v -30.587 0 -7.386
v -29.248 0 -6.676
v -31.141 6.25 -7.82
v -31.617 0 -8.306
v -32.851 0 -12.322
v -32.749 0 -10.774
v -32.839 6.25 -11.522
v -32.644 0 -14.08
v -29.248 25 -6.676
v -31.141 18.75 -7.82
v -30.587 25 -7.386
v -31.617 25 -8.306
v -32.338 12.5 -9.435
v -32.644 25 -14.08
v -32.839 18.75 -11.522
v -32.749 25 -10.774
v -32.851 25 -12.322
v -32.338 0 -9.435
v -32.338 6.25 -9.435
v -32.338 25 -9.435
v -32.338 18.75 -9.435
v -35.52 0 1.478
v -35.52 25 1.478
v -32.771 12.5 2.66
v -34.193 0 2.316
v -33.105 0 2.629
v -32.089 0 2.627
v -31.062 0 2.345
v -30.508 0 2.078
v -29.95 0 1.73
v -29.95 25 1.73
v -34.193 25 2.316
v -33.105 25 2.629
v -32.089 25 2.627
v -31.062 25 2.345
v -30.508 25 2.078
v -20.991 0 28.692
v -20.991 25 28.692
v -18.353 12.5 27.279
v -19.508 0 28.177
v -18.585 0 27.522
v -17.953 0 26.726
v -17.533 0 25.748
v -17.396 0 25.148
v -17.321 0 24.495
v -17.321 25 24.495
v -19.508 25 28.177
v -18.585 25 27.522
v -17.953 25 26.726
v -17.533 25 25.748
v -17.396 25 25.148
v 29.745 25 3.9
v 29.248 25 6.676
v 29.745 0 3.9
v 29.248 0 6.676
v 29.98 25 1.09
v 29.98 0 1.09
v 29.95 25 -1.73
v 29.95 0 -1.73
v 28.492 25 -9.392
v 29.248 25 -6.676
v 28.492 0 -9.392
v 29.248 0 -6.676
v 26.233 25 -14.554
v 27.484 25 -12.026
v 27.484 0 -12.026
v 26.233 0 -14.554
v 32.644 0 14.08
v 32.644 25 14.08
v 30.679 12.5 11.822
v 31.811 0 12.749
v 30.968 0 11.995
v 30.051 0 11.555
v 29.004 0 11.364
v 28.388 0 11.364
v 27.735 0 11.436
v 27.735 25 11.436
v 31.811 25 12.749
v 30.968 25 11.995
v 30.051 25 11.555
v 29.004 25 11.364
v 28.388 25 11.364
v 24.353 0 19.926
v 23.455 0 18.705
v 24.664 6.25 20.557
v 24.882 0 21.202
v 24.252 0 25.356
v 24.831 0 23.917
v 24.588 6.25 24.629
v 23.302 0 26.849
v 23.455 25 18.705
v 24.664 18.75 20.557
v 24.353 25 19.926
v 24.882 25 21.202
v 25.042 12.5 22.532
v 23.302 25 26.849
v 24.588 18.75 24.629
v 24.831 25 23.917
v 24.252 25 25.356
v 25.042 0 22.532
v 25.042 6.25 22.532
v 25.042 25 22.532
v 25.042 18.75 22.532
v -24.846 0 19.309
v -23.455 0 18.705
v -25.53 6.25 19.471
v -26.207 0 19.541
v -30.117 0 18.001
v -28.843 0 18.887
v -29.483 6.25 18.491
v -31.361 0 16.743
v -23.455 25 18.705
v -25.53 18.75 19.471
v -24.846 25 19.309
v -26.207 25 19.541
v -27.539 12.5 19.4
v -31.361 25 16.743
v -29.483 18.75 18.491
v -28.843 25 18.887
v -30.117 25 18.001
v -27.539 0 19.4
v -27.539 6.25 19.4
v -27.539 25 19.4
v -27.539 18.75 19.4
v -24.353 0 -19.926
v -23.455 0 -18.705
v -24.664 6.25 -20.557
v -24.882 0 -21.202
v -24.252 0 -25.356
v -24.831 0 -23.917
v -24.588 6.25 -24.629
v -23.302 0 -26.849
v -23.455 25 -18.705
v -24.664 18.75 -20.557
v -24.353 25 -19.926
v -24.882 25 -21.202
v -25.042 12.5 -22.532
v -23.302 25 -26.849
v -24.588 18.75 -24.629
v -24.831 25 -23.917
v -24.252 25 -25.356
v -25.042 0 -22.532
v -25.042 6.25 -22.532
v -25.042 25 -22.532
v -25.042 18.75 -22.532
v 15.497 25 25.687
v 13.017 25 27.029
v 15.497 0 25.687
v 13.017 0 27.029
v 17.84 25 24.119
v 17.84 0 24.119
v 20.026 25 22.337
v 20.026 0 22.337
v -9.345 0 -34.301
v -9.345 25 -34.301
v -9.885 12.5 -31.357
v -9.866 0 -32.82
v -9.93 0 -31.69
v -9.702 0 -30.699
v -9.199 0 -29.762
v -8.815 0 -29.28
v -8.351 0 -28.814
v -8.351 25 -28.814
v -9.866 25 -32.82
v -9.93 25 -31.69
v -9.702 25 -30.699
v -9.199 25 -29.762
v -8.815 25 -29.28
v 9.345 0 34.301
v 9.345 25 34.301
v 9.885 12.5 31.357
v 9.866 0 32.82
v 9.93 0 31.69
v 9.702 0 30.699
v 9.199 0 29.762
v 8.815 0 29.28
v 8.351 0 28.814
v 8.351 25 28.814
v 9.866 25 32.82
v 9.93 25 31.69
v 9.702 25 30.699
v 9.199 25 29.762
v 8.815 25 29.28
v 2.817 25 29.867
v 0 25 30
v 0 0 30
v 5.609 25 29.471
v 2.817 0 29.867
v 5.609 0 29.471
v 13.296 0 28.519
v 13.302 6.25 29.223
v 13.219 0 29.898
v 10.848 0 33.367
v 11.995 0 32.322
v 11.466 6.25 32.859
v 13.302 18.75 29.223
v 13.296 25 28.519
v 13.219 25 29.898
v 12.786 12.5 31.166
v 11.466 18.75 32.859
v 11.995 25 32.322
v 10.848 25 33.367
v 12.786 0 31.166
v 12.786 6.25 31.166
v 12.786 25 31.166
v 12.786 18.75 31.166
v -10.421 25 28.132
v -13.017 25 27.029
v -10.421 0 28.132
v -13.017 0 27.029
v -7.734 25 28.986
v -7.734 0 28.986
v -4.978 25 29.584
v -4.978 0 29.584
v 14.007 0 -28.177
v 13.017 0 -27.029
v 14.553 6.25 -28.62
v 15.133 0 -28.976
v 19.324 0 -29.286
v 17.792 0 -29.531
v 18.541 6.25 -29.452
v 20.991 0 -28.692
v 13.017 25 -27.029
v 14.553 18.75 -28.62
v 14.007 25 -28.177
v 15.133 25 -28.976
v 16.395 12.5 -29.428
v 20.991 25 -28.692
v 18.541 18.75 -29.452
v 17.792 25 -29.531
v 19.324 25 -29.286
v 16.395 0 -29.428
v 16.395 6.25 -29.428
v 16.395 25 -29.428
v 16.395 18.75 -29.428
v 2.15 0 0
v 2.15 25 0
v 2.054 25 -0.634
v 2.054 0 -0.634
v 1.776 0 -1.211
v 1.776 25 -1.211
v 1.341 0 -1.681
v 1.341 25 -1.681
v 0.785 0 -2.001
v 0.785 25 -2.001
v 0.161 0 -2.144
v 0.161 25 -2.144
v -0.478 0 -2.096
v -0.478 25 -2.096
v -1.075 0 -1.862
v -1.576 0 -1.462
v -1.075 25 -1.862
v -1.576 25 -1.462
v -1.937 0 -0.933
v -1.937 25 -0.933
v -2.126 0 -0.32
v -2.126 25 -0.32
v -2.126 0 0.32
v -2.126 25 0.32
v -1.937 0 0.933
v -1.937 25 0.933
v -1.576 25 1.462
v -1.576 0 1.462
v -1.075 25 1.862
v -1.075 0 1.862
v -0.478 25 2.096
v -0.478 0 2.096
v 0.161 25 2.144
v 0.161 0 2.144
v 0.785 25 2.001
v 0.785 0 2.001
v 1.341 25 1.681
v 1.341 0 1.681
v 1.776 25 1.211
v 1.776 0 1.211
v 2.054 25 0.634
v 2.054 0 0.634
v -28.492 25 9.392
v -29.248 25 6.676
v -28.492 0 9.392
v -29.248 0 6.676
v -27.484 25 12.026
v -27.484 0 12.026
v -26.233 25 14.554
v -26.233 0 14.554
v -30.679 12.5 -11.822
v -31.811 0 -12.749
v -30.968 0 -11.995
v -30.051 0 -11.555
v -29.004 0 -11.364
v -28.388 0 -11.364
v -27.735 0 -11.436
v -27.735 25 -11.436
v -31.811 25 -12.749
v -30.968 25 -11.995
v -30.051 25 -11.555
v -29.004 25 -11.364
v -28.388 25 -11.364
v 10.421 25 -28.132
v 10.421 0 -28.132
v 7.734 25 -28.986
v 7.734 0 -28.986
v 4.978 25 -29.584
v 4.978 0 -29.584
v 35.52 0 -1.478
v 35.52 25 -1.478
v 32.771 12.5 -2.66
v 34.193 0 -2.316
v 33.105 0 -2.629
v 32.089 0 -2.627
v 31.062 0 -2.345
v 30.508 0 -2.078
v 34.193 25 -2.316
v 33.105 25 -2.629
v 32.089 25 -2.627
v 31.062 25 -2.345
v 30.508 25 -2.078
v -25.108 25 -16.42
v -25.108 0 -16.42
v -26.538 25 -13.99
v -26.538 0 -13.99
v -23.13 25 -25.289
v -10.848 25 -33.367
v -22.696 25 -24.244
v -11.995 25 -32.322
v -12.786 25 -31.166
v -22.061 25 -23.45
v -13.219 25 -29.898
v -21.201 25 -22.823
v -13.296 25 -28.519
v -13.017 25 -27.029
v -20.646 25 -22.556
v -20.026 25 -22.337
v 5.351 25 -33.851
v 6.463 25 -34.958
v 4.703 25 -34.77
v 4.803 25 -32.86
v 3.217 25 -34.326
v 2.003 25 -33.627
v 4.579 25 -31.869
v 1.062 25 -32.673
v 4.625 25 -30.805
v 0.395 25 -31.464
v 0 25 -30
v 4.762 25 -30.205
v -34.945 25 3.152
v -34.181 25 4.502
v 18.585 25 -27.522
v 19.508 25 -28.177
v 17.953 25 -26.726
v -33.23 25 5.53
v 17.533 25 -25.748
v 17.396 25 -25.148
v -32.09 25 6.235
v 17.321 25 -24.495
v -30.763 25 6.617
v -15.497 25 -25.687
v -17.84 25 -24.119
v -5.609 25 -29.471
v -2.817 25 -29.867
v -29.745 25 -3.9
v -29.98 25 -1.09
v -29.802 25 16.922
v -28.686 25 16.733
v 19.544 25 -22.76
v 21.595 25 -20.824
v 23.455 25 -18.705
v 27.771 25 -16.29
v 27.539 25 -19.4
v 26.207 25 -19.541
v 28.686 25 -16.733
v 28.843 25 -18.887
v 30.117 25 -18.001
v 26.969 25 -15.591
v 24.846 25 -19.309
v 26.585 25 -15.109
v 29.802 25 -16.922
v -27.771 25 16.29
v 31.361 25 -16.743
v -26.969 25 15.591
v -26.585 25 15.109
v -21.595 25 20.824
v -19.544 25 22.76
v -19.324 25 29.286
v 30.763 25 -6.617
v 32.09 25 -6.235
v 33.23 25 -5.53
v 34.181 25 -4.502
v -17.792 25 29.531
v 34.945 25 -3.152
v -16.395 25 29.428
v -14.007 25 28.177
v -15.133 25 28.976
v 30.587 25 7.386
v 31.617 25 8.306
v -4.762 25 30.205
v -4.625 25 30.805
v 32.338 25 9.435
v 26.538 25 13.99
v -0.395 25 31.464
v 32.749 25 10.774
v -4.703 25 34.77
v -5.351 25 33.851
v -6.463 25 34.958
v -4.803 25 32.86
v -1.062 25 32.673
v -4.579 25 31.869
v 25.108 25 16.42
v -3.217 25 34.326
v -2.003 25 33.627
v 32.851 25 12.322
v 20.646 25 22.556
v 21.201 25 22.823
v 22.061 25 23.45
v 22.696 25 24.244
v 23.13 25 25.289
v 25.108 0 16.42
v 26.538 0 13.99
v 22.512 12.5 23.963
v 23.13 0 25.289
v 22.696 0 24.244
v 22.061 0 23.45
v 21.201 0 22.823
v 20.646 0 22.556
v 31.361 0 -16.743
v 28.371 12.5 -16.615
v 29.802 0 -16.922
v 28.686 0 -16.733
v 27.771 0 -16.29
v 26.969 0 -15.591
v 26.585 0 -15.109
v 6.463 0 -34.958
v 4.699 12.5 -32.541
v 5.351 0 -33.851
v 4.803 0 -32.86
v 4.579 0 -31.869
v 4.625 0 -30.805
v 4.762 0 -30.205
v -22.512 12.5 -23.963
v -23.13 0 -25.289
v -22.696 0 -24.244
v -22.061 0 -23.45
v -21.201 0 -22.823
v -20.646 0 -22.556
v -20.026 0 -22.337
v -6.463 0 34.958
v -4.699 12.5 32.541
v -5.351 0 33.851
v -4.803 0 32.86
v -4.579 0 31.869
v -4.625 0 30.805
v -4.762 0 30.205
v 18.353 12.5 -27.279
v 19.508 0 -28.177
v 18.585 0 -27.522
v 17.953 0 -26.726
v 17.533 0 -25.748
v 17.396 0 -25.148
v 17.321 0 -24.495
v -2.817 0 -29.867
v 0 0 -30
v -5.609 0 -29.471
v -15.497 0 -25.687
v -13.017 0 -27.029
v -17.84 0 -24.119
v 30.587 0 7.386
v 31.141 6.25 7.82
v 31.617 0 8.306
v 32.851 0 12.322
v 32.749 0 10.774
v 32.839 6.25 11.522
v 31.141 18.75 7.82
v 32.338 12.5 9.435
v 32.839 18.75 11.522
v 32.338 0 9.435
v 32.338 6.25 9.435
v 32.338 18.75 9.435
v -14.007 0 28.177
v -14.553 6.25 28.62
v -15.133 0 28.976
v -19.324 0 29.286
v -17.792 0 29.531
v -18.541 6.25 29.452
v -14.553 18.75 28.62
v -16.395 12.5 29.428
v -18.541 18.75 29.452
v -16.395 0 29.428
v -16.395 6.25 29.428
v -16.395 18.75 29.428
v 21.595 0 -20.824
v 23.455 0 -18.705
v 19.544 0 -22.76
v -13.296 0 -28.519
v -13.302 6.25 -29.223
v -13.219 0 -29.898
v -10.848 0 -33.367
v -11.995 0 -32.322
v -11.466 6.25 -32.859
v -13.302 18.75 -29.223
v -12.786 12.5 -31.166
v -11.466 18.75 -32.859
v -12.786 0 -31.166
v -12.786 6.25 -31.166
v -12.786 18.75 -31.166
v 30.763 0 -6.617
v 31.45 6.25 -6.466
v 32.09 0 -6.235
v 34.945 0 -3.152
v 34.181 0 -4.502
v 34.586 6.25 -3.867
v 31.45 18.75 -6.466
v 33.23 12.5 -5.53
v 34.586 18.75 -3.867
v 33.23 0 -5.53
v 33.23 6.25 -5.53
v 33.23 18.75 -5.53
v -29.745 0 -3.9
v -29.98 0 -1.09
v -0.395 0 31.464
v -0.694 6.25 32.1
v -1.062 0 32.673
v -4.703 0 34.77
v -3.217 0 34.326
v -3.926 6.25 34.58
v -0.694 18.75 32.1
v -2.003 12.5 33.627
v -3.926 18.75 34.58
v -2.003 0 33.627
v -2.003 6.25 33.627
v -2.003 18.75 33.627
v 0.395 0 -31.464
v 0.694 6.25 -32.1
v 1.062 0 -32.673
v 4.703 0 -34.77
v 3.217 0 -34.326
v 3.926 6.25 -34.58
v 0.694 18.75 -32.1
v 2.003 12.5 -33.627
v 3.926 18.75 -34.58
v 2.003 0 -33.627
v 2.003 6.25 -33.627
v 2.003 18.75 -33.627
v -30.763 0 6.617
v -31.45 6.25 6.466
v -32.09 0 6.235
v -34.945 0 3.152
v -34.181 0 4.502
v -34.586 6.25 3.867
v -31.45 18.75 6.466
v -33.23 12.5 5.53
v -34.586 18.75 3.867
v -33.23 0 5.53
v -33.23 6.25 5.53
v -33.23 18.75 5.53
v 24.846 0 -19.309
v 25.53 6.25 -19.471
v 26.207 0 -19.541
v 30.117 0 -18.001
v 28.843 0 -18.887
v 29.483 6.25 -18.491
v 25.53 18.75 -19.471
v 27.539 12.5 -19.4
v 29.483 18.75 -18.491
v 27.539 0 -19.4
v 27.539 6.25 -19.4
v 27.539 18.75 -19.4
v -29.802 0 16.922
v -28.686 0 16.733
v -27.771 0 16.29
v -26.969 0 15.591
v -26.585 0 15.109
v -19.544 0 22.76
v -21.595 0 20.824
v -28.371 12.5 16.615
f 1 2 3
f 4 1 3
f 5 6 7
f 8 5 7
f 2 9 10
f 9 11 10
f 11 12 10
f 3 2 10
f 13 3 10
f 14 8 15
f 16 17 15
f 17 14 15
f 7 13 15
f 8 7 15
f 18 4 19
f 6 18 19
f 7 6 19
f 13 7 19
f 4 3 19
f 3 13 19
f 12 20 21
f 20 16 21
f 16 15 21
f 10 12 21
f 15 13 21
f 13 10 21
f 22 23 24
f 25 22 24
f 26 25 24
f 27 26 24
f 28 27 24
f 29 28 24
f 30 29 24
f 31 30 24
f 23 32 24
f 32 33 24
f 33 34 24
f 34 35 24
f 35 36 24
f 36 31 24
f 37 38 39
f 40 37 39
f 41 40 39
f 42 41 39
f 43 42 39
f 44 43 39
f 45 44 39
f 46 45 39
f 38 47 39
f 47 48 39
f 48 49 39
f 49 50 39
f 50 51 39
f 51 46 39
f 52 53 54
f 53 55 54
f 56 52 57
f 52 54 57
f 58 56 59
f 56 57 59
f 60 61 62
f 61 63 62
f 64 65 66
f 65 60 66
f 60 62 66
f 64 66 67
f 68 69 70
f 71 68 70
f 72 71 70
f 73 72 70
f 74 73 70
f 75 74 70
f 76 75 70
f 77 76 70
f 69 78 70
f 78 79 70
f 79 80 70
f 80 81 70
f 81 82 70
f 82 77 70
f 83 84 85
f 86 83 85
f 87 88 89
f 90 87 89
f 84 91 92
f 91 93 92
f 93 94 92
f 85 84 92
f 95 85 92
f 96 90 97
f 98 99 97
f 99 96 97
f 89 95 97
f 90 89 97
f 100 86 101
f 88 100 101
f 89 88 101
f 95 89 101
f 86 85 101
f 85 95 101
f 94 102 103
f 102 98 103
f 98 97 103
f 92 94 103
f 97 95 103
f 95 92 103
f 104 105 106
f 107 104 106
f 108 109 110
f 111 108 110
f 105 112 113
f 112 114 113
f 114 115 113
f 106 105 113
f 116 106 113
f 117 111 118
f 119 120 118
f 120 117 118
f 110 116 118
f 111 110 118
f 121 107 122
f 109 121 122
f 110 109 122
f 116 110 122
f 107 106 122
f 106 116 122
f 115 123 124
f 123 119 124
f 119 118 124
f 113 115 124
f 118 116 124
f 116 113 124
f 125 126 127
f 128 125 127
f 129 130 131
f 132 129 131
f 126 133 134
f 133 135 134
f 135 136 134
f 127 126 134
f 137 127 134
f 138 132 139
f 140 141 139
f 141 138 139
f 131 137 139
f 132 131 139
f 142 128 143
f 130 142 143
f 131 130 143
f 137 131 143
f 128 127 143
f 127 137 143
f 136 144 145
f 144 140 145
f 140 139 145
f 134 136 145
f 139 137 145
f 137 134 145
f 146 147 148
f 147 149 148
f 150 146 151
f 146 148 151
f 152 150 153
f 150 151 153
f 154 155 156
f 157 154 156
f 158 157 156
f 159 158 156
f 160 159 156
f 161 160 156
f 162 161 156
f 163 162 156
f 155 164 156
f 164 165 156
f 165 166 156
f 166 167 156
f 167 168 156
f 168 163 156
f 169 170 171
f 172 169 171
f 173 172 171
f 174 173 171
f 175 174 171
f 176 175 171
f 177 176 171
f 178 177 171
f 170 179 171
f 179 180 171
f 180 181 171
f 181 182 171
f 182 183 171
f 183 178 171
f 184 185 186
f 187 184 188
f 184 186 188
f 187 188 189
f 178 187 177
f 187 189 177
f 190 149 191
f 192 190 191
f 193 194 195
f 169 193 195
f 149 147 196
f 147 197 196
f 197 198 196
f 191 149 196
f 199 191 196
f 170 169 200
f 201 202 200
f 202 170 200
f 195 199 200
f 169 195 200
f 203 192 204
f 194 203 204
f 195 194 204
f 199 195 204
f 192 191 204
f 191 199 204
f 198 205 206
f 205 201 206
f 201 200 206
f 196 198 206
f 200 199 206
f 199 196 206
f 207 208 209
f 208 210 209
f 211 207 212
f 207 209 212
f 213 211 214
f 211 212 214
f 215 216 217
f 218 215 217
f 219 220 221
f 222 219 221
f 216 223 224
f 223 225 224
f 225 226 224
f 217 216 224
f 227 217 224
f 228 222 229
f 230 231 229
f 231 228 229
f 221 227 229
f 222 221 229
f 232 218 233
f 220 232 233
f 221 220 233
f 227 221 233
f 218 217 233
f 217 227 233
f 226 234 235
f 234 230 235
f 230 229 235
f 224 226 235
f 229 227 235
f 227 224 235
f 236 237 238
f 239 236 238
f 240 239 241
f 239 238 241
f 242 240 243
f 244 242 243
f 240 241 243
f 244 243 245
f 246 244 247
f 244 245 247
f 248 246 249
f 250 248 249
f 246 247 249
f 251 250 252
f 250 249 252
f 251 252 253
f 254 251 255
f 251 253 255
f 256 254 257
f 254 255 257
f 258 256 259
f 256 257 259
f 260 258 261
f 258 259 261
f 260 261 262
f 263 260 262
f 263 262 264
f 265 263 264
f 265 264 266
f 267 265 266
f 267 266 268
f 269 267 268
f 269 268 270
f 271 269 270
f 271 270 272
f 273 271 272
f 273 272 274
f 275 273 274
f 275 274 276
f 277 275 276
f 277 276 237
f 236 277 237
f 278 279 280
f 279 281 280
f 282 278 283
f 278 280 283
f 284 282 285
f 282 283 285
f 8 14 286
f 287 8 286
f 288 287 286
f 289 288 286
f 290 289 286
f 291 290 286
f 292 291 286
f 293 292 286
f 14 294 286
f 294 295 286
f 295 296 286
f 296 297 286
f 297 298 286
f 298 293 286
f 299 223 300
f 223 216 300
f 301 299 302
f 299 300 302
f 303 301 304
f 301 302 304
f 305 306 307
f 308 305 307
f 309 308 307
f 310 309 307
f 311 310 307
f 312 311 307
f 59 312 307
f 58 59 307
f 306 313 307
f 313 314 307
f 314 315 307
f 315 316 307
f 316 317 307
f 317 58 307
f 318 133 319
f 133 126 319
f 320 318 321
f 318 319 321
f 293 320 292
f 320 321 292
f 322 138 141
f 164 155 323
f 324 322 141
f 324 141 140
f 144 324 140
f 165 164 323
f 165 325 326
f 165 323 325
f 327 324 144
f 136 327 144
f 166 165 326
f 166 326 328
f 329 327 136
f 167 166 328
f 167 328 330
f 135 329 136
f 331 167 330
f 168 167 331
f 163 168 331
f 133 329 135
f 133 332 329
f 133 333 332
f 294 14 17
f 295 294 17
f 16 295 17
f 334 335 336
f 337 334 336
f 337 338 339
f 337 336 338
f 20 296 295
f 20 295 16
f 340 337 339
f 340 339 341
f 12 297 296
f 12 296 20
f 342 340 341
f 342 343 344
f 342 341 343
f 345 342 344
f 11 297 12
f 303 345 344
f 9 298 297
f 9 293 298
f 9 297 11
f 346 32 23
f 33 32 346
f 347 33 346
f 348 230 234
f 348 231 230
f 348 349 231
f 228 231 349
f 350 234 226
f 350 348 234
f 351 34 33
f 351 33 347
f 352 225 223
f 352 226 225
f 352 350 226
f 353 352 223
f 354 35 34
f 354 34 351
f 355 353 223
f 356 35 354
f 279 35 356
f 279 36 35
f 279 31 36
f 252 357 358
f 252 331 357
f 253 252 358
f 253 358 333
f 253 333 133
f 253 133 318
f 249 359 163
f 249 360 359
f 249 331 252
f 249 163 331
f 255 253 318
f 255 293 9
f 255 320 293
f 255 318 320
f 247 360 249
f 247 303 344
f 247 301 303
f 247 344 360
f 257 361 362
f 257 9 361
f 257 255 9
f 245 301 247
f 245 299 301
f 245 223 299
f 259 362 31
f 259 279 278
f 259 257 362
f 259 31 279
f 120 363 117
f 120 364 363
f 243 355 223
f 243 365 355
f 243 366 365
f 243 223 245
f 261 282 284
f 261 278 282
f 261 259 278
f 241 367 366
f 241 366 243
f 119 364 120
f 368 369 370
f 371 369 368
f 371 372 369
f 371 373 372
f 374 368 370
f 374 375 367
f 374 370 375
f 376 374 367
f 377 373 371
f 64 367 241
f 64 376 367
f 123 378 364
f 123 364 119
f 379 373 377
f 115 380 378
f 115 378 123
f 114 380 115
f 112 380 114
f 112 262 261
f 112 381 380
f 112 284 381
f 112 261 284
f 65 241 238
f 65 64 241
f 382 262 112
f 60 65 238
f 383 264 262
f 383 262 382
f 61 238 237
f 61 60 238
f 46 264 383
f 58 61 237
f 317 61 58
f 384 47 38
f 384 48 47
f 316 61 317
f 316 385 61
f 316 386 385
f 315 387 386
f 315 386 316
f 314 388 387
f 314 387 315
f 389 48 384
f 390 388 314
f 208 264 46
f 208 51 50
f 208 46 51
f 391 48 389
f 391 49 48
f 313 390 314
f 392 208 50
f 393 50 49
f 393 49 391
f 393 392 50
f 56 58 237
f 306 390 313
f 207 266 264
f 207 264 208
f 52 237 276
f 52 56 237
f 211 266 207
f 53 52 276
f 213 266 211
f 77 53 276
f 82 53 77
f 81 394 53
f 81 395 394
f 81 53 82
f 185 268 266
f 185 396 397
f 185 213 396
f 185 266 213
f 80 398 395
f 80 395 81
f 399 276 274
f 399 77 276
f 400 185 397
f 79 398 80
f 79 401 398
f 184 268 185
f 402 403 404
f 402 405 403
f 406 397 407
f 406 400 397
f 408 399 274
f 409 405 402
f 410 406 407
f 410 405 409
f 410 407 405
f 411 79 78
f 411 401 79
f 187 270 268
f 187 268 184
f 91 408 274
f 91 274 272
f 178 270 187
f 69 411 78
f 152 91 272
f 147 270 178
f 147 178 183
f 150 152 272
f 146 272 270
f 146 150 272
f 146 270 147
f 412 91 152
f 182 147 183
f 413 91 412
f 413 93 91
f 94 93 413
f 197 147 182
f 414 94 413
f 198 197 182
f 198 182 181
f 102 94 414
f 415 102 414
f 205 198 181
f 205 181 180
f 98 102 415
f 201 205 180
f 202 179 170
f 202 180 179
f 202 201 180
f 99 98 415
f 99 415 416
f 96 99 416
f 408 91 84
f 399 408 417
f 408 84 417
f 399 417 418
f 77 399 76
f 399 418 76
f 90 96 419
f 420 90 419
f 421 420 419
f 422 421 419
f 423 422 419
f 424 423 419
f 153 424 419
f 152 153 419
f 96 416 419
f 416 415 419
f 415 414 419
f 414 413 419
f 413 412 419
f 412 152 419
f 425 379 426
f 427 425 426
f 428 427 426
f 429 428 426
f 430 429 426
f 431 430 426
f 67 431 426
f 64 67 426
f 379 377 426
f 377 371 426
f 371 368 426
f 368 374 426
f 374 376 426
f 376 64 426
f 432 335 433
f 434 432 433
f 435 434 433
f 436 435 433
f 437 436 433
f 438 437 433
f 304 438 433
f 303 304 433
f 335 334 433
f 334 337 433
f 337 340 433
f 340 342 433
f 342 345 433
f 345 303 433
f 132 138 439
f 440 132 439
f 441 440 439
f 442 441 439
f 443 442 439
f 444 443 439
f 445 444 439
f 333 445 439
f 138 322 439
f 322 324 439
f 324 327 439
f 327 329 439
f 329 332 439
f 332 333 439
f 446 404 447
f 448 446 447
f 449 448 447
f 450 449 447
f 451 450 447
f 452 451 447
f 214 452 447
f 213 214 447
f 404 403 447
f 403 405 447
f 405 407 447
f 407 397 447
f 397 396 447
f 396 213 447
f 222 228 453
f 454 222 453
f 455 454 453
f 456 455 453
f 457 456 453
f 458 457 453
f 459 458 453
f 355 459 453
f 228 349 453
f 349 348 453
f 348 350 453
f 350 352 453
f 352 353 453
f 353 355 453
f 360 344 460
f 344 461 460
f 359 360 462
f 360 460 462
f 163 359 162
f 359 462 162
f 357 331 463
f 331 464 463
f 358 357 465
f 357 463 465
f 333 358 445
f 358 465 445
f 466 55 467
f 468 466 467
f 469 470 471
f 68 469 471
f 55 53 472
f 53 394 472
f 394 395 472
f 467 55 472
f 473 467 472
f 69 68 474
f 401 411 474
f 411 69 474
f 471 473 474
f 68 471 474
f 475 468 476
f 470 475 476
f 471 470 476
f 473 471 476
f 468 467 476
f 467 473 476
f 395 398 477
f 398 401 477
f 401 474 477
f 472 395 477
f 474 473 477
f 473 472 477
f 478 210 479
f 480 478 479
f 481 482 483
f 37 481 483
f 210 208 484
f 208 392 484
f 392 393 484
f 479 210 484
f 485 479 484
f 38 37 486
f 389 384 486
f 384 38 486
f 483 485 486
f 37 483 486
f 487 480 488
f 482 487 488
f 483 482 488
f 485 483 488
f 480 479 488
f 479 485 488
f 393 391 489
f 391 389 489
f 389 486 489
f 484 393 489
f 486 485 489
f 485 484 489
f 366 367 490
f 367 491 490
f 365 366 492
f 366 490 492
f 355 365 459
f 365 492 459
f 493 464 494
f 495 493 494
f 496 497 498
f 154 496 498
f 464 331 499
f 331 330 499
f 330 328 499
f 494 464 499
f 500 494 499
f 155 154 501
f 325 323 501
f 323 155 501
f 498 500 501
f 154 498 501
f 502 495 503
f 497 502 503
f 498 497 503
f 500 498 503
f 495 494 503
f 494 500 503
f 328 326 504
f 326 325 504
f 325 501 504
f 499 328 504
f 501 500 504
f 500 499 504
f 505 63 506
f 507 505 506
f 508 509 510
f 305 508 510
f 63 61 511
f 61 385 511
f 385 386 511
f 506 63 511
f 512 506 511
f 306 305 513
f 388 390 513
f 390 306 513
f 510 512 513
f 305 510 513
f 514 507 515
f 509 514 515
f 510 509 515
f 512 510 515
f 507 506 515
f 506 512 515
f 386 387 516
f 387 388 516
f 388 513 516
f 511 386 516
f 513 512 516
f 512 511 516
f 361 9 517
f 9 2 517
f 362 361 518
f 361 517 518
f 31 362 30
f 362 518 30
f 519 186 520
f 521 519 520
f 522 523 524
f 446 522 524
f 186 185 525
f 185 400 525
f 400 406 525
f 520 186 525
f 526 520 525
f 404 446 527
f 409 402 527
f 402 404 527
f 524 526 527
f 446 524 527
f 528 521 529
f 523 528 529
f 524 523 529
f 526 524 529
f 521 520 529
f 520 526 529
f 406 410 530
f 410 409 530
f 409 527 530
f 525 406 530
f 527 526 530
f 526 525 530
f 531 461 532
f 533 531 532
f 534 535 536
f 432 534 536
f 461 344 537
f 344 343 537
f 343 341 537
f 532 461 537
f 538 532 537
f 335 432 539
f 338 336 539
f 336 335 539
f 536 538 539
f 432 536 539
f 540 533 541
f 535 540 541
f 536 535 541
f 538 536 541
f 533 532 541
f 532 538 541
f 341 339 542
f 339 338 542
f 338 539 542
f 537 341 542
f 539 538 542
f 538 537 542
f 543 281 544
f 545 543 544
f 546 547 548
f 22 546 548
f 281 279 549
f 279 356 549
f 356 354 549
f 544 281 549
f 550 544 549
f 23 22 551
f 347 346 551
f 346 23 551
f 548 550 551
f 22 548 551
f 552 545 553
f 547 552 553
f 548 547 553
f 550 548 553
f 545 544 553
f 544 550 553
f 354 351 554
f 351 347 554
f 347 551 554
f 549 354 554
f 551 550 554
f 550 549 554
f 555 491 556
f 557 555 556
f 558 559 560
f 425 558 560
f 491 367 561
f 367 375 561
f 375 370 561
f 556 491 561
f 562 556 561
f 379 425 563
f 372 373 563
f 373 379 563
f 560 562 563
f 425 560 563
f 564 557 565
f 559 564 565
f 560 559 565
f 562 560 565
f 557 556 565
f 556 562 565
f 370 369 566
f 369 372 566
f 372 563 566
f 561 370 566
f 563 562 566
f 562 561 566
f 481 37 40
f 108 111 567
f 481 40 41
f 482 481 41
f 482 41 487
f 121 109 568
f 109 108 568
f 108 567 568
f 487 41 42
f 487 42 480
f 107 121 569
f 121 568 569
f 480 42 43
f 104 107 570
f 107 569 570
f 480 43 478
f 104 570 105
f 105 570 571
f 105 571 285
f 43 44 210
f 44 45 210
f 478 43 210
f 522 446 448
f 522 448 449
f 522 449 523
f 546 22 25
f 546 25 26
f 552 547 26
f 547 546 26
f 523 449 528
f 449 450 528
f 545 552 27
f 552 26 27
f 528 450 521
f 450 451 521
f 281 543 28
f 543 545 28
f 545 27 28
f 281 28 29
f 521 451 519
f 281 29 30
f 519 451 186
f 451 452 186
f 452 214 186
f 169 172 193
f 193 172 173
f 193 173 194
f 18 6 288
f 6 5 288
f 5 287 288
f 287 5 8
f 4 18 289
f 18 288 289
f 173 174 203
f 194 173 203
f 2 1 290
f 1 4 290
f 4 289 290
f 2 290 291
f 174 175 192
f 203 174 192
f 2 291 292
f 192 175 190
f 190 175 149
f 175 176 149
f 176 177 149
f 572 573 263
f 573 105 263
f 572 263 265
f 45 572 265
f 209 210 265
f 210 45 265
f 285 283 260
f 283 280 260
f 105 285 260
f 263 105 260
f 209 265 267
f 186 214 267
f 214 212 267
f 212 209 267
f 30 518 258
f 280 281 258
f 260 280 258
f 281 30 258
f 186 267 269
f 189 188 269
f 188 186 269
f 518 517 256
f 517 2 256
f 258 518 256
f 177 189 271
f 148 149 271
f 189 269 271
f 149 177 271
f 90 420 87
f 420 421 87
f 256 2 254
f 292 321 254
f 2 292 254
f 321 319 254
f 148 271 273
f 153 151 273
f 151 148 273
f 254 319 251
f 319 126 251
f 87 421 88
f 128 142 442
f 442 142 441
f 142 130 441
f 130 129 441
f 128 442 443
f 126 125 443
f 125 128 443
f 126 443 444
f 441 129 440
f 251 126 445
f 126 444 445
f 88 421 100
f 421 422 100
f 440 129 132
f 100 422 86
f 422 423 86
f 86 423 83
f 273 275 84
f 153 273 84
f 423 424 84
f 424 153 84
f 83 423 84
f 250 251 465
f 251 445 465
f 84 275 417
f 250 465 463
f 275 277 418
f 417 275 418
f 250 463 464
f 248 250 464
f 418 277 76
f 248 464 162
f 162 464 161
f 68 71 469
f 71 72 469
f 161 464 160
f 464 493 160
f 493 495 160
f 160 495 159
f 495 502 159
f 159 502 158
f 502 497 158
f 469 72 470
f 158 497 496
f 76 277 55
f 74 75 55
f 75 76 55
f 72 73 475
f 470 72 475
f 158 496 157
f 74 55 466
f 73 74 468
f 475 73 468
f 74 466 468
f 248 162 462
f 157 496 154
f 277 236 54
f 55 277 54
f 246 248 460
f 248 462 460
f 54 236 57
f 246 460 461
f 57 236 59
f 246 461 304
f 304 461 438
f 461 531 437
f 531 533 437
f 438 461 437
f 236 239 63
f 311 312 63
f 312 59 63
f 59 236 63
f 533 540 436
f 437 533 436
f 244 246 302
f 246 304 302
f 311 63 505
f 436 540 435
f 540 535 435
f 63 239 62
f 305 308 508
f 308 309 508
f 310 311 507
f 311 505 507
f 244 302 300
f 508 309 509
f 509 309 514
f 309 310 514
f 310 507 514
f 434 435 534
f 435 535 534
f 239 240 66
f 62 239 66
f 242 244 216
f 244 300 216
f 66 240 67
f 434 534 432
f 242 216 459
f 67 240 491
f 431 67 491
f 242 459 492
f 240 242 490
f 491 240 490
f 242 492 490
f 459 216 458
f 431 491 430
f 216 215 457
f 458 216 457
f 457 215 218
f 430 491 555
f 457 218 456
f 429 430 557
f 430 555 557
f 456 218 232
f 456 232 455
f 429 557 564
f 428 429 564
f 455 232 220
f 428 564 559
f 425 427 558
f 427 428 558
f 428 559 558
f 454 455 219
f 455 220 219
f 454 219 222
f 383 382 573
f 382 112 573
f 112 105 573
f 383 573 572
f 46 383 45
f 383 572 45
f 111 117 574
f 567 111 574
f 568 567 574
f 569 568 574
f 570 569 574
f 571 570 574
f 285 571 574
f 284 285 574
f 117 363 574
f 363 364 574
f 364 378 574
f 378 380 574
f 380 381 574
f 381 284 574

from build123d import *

# Parameters (mm, degrees)
SKETCH1_R           = 30
BOSS_EXTRUDE1_DEPTH = 25
SKETCH2_R           = 2.15
CUT_EXTRUDE1_DEPTH  = 26
BOSS_EXTRUDE2_DEPTH = 25
CIRPATTERN1_COUNT   = 14


with BuildPart() as part:
    # Sketch1 → Boss-Extrude1 (new body)
    with BuildSketch(Plane(origin=(0, 0, 0), x_dir=(1, 0, 0), z_dir=(0, 1, 0))):
        Circle(SKETCH1_R)
    extrude(amount=BOSS_EXTRUDE1_DEPTH)

    # Sketch2 → Cut-Extrude1 (cut, through all)
    with BuildSketch(Plane(origin=(0, 25, 0), x_dir=(1, 0, 0), z_dir=(0, 1, 0))):
        Circle(SKETCH2_R)
    extrude(amount=-CUT_EXTRUDE1_DEPTH, mode=Mode.SUBTRACT)

    # Sketch3 → Boss-Extrude2 (add, through all)
    with BuildSketch(Plane(origin=(0, 25, 0), x_dir=(1, 0, 0), z_dir=(0, 1, 0))):
        with BuildLine():
            Line((0, 30), (3.378956964, 26.809860285))
            Line((3.378956964, 26.809860285), (4.977675541, 29.584163774))
            add(Edge.make_bspline(
                [(6.463090103, 34.958464686), (3.678095749, 32.81046922), (4.977675541, 29.584163774)],
                knots=[0, 0, 0, 1, 1, 1], degree=2))
            add(Edge.make_bspline(
                [(0, 30), (0.774451362, 34.774618744), (6.463090103, 34.958464686)],
                knots=[0, 0, 0, 1, 1, 1], degree=2))
        make_face()
    boss_extrude2 = extrude(amount=-BOSS_EXTRUDE2_DEPTH)

    # CirPattern1: Boss-Extrude2 ×14 about axis
    cirpattern1_axis = Axis((0, 0, 0), (0, 1, 0))
    for i in range(1, CIRPATTERN1_COUNT):
        add(boss_extrude2.rotate(cirpattern1_axis, i * 360 / CIRPATTERN1_COUNT))


solid = part.part
